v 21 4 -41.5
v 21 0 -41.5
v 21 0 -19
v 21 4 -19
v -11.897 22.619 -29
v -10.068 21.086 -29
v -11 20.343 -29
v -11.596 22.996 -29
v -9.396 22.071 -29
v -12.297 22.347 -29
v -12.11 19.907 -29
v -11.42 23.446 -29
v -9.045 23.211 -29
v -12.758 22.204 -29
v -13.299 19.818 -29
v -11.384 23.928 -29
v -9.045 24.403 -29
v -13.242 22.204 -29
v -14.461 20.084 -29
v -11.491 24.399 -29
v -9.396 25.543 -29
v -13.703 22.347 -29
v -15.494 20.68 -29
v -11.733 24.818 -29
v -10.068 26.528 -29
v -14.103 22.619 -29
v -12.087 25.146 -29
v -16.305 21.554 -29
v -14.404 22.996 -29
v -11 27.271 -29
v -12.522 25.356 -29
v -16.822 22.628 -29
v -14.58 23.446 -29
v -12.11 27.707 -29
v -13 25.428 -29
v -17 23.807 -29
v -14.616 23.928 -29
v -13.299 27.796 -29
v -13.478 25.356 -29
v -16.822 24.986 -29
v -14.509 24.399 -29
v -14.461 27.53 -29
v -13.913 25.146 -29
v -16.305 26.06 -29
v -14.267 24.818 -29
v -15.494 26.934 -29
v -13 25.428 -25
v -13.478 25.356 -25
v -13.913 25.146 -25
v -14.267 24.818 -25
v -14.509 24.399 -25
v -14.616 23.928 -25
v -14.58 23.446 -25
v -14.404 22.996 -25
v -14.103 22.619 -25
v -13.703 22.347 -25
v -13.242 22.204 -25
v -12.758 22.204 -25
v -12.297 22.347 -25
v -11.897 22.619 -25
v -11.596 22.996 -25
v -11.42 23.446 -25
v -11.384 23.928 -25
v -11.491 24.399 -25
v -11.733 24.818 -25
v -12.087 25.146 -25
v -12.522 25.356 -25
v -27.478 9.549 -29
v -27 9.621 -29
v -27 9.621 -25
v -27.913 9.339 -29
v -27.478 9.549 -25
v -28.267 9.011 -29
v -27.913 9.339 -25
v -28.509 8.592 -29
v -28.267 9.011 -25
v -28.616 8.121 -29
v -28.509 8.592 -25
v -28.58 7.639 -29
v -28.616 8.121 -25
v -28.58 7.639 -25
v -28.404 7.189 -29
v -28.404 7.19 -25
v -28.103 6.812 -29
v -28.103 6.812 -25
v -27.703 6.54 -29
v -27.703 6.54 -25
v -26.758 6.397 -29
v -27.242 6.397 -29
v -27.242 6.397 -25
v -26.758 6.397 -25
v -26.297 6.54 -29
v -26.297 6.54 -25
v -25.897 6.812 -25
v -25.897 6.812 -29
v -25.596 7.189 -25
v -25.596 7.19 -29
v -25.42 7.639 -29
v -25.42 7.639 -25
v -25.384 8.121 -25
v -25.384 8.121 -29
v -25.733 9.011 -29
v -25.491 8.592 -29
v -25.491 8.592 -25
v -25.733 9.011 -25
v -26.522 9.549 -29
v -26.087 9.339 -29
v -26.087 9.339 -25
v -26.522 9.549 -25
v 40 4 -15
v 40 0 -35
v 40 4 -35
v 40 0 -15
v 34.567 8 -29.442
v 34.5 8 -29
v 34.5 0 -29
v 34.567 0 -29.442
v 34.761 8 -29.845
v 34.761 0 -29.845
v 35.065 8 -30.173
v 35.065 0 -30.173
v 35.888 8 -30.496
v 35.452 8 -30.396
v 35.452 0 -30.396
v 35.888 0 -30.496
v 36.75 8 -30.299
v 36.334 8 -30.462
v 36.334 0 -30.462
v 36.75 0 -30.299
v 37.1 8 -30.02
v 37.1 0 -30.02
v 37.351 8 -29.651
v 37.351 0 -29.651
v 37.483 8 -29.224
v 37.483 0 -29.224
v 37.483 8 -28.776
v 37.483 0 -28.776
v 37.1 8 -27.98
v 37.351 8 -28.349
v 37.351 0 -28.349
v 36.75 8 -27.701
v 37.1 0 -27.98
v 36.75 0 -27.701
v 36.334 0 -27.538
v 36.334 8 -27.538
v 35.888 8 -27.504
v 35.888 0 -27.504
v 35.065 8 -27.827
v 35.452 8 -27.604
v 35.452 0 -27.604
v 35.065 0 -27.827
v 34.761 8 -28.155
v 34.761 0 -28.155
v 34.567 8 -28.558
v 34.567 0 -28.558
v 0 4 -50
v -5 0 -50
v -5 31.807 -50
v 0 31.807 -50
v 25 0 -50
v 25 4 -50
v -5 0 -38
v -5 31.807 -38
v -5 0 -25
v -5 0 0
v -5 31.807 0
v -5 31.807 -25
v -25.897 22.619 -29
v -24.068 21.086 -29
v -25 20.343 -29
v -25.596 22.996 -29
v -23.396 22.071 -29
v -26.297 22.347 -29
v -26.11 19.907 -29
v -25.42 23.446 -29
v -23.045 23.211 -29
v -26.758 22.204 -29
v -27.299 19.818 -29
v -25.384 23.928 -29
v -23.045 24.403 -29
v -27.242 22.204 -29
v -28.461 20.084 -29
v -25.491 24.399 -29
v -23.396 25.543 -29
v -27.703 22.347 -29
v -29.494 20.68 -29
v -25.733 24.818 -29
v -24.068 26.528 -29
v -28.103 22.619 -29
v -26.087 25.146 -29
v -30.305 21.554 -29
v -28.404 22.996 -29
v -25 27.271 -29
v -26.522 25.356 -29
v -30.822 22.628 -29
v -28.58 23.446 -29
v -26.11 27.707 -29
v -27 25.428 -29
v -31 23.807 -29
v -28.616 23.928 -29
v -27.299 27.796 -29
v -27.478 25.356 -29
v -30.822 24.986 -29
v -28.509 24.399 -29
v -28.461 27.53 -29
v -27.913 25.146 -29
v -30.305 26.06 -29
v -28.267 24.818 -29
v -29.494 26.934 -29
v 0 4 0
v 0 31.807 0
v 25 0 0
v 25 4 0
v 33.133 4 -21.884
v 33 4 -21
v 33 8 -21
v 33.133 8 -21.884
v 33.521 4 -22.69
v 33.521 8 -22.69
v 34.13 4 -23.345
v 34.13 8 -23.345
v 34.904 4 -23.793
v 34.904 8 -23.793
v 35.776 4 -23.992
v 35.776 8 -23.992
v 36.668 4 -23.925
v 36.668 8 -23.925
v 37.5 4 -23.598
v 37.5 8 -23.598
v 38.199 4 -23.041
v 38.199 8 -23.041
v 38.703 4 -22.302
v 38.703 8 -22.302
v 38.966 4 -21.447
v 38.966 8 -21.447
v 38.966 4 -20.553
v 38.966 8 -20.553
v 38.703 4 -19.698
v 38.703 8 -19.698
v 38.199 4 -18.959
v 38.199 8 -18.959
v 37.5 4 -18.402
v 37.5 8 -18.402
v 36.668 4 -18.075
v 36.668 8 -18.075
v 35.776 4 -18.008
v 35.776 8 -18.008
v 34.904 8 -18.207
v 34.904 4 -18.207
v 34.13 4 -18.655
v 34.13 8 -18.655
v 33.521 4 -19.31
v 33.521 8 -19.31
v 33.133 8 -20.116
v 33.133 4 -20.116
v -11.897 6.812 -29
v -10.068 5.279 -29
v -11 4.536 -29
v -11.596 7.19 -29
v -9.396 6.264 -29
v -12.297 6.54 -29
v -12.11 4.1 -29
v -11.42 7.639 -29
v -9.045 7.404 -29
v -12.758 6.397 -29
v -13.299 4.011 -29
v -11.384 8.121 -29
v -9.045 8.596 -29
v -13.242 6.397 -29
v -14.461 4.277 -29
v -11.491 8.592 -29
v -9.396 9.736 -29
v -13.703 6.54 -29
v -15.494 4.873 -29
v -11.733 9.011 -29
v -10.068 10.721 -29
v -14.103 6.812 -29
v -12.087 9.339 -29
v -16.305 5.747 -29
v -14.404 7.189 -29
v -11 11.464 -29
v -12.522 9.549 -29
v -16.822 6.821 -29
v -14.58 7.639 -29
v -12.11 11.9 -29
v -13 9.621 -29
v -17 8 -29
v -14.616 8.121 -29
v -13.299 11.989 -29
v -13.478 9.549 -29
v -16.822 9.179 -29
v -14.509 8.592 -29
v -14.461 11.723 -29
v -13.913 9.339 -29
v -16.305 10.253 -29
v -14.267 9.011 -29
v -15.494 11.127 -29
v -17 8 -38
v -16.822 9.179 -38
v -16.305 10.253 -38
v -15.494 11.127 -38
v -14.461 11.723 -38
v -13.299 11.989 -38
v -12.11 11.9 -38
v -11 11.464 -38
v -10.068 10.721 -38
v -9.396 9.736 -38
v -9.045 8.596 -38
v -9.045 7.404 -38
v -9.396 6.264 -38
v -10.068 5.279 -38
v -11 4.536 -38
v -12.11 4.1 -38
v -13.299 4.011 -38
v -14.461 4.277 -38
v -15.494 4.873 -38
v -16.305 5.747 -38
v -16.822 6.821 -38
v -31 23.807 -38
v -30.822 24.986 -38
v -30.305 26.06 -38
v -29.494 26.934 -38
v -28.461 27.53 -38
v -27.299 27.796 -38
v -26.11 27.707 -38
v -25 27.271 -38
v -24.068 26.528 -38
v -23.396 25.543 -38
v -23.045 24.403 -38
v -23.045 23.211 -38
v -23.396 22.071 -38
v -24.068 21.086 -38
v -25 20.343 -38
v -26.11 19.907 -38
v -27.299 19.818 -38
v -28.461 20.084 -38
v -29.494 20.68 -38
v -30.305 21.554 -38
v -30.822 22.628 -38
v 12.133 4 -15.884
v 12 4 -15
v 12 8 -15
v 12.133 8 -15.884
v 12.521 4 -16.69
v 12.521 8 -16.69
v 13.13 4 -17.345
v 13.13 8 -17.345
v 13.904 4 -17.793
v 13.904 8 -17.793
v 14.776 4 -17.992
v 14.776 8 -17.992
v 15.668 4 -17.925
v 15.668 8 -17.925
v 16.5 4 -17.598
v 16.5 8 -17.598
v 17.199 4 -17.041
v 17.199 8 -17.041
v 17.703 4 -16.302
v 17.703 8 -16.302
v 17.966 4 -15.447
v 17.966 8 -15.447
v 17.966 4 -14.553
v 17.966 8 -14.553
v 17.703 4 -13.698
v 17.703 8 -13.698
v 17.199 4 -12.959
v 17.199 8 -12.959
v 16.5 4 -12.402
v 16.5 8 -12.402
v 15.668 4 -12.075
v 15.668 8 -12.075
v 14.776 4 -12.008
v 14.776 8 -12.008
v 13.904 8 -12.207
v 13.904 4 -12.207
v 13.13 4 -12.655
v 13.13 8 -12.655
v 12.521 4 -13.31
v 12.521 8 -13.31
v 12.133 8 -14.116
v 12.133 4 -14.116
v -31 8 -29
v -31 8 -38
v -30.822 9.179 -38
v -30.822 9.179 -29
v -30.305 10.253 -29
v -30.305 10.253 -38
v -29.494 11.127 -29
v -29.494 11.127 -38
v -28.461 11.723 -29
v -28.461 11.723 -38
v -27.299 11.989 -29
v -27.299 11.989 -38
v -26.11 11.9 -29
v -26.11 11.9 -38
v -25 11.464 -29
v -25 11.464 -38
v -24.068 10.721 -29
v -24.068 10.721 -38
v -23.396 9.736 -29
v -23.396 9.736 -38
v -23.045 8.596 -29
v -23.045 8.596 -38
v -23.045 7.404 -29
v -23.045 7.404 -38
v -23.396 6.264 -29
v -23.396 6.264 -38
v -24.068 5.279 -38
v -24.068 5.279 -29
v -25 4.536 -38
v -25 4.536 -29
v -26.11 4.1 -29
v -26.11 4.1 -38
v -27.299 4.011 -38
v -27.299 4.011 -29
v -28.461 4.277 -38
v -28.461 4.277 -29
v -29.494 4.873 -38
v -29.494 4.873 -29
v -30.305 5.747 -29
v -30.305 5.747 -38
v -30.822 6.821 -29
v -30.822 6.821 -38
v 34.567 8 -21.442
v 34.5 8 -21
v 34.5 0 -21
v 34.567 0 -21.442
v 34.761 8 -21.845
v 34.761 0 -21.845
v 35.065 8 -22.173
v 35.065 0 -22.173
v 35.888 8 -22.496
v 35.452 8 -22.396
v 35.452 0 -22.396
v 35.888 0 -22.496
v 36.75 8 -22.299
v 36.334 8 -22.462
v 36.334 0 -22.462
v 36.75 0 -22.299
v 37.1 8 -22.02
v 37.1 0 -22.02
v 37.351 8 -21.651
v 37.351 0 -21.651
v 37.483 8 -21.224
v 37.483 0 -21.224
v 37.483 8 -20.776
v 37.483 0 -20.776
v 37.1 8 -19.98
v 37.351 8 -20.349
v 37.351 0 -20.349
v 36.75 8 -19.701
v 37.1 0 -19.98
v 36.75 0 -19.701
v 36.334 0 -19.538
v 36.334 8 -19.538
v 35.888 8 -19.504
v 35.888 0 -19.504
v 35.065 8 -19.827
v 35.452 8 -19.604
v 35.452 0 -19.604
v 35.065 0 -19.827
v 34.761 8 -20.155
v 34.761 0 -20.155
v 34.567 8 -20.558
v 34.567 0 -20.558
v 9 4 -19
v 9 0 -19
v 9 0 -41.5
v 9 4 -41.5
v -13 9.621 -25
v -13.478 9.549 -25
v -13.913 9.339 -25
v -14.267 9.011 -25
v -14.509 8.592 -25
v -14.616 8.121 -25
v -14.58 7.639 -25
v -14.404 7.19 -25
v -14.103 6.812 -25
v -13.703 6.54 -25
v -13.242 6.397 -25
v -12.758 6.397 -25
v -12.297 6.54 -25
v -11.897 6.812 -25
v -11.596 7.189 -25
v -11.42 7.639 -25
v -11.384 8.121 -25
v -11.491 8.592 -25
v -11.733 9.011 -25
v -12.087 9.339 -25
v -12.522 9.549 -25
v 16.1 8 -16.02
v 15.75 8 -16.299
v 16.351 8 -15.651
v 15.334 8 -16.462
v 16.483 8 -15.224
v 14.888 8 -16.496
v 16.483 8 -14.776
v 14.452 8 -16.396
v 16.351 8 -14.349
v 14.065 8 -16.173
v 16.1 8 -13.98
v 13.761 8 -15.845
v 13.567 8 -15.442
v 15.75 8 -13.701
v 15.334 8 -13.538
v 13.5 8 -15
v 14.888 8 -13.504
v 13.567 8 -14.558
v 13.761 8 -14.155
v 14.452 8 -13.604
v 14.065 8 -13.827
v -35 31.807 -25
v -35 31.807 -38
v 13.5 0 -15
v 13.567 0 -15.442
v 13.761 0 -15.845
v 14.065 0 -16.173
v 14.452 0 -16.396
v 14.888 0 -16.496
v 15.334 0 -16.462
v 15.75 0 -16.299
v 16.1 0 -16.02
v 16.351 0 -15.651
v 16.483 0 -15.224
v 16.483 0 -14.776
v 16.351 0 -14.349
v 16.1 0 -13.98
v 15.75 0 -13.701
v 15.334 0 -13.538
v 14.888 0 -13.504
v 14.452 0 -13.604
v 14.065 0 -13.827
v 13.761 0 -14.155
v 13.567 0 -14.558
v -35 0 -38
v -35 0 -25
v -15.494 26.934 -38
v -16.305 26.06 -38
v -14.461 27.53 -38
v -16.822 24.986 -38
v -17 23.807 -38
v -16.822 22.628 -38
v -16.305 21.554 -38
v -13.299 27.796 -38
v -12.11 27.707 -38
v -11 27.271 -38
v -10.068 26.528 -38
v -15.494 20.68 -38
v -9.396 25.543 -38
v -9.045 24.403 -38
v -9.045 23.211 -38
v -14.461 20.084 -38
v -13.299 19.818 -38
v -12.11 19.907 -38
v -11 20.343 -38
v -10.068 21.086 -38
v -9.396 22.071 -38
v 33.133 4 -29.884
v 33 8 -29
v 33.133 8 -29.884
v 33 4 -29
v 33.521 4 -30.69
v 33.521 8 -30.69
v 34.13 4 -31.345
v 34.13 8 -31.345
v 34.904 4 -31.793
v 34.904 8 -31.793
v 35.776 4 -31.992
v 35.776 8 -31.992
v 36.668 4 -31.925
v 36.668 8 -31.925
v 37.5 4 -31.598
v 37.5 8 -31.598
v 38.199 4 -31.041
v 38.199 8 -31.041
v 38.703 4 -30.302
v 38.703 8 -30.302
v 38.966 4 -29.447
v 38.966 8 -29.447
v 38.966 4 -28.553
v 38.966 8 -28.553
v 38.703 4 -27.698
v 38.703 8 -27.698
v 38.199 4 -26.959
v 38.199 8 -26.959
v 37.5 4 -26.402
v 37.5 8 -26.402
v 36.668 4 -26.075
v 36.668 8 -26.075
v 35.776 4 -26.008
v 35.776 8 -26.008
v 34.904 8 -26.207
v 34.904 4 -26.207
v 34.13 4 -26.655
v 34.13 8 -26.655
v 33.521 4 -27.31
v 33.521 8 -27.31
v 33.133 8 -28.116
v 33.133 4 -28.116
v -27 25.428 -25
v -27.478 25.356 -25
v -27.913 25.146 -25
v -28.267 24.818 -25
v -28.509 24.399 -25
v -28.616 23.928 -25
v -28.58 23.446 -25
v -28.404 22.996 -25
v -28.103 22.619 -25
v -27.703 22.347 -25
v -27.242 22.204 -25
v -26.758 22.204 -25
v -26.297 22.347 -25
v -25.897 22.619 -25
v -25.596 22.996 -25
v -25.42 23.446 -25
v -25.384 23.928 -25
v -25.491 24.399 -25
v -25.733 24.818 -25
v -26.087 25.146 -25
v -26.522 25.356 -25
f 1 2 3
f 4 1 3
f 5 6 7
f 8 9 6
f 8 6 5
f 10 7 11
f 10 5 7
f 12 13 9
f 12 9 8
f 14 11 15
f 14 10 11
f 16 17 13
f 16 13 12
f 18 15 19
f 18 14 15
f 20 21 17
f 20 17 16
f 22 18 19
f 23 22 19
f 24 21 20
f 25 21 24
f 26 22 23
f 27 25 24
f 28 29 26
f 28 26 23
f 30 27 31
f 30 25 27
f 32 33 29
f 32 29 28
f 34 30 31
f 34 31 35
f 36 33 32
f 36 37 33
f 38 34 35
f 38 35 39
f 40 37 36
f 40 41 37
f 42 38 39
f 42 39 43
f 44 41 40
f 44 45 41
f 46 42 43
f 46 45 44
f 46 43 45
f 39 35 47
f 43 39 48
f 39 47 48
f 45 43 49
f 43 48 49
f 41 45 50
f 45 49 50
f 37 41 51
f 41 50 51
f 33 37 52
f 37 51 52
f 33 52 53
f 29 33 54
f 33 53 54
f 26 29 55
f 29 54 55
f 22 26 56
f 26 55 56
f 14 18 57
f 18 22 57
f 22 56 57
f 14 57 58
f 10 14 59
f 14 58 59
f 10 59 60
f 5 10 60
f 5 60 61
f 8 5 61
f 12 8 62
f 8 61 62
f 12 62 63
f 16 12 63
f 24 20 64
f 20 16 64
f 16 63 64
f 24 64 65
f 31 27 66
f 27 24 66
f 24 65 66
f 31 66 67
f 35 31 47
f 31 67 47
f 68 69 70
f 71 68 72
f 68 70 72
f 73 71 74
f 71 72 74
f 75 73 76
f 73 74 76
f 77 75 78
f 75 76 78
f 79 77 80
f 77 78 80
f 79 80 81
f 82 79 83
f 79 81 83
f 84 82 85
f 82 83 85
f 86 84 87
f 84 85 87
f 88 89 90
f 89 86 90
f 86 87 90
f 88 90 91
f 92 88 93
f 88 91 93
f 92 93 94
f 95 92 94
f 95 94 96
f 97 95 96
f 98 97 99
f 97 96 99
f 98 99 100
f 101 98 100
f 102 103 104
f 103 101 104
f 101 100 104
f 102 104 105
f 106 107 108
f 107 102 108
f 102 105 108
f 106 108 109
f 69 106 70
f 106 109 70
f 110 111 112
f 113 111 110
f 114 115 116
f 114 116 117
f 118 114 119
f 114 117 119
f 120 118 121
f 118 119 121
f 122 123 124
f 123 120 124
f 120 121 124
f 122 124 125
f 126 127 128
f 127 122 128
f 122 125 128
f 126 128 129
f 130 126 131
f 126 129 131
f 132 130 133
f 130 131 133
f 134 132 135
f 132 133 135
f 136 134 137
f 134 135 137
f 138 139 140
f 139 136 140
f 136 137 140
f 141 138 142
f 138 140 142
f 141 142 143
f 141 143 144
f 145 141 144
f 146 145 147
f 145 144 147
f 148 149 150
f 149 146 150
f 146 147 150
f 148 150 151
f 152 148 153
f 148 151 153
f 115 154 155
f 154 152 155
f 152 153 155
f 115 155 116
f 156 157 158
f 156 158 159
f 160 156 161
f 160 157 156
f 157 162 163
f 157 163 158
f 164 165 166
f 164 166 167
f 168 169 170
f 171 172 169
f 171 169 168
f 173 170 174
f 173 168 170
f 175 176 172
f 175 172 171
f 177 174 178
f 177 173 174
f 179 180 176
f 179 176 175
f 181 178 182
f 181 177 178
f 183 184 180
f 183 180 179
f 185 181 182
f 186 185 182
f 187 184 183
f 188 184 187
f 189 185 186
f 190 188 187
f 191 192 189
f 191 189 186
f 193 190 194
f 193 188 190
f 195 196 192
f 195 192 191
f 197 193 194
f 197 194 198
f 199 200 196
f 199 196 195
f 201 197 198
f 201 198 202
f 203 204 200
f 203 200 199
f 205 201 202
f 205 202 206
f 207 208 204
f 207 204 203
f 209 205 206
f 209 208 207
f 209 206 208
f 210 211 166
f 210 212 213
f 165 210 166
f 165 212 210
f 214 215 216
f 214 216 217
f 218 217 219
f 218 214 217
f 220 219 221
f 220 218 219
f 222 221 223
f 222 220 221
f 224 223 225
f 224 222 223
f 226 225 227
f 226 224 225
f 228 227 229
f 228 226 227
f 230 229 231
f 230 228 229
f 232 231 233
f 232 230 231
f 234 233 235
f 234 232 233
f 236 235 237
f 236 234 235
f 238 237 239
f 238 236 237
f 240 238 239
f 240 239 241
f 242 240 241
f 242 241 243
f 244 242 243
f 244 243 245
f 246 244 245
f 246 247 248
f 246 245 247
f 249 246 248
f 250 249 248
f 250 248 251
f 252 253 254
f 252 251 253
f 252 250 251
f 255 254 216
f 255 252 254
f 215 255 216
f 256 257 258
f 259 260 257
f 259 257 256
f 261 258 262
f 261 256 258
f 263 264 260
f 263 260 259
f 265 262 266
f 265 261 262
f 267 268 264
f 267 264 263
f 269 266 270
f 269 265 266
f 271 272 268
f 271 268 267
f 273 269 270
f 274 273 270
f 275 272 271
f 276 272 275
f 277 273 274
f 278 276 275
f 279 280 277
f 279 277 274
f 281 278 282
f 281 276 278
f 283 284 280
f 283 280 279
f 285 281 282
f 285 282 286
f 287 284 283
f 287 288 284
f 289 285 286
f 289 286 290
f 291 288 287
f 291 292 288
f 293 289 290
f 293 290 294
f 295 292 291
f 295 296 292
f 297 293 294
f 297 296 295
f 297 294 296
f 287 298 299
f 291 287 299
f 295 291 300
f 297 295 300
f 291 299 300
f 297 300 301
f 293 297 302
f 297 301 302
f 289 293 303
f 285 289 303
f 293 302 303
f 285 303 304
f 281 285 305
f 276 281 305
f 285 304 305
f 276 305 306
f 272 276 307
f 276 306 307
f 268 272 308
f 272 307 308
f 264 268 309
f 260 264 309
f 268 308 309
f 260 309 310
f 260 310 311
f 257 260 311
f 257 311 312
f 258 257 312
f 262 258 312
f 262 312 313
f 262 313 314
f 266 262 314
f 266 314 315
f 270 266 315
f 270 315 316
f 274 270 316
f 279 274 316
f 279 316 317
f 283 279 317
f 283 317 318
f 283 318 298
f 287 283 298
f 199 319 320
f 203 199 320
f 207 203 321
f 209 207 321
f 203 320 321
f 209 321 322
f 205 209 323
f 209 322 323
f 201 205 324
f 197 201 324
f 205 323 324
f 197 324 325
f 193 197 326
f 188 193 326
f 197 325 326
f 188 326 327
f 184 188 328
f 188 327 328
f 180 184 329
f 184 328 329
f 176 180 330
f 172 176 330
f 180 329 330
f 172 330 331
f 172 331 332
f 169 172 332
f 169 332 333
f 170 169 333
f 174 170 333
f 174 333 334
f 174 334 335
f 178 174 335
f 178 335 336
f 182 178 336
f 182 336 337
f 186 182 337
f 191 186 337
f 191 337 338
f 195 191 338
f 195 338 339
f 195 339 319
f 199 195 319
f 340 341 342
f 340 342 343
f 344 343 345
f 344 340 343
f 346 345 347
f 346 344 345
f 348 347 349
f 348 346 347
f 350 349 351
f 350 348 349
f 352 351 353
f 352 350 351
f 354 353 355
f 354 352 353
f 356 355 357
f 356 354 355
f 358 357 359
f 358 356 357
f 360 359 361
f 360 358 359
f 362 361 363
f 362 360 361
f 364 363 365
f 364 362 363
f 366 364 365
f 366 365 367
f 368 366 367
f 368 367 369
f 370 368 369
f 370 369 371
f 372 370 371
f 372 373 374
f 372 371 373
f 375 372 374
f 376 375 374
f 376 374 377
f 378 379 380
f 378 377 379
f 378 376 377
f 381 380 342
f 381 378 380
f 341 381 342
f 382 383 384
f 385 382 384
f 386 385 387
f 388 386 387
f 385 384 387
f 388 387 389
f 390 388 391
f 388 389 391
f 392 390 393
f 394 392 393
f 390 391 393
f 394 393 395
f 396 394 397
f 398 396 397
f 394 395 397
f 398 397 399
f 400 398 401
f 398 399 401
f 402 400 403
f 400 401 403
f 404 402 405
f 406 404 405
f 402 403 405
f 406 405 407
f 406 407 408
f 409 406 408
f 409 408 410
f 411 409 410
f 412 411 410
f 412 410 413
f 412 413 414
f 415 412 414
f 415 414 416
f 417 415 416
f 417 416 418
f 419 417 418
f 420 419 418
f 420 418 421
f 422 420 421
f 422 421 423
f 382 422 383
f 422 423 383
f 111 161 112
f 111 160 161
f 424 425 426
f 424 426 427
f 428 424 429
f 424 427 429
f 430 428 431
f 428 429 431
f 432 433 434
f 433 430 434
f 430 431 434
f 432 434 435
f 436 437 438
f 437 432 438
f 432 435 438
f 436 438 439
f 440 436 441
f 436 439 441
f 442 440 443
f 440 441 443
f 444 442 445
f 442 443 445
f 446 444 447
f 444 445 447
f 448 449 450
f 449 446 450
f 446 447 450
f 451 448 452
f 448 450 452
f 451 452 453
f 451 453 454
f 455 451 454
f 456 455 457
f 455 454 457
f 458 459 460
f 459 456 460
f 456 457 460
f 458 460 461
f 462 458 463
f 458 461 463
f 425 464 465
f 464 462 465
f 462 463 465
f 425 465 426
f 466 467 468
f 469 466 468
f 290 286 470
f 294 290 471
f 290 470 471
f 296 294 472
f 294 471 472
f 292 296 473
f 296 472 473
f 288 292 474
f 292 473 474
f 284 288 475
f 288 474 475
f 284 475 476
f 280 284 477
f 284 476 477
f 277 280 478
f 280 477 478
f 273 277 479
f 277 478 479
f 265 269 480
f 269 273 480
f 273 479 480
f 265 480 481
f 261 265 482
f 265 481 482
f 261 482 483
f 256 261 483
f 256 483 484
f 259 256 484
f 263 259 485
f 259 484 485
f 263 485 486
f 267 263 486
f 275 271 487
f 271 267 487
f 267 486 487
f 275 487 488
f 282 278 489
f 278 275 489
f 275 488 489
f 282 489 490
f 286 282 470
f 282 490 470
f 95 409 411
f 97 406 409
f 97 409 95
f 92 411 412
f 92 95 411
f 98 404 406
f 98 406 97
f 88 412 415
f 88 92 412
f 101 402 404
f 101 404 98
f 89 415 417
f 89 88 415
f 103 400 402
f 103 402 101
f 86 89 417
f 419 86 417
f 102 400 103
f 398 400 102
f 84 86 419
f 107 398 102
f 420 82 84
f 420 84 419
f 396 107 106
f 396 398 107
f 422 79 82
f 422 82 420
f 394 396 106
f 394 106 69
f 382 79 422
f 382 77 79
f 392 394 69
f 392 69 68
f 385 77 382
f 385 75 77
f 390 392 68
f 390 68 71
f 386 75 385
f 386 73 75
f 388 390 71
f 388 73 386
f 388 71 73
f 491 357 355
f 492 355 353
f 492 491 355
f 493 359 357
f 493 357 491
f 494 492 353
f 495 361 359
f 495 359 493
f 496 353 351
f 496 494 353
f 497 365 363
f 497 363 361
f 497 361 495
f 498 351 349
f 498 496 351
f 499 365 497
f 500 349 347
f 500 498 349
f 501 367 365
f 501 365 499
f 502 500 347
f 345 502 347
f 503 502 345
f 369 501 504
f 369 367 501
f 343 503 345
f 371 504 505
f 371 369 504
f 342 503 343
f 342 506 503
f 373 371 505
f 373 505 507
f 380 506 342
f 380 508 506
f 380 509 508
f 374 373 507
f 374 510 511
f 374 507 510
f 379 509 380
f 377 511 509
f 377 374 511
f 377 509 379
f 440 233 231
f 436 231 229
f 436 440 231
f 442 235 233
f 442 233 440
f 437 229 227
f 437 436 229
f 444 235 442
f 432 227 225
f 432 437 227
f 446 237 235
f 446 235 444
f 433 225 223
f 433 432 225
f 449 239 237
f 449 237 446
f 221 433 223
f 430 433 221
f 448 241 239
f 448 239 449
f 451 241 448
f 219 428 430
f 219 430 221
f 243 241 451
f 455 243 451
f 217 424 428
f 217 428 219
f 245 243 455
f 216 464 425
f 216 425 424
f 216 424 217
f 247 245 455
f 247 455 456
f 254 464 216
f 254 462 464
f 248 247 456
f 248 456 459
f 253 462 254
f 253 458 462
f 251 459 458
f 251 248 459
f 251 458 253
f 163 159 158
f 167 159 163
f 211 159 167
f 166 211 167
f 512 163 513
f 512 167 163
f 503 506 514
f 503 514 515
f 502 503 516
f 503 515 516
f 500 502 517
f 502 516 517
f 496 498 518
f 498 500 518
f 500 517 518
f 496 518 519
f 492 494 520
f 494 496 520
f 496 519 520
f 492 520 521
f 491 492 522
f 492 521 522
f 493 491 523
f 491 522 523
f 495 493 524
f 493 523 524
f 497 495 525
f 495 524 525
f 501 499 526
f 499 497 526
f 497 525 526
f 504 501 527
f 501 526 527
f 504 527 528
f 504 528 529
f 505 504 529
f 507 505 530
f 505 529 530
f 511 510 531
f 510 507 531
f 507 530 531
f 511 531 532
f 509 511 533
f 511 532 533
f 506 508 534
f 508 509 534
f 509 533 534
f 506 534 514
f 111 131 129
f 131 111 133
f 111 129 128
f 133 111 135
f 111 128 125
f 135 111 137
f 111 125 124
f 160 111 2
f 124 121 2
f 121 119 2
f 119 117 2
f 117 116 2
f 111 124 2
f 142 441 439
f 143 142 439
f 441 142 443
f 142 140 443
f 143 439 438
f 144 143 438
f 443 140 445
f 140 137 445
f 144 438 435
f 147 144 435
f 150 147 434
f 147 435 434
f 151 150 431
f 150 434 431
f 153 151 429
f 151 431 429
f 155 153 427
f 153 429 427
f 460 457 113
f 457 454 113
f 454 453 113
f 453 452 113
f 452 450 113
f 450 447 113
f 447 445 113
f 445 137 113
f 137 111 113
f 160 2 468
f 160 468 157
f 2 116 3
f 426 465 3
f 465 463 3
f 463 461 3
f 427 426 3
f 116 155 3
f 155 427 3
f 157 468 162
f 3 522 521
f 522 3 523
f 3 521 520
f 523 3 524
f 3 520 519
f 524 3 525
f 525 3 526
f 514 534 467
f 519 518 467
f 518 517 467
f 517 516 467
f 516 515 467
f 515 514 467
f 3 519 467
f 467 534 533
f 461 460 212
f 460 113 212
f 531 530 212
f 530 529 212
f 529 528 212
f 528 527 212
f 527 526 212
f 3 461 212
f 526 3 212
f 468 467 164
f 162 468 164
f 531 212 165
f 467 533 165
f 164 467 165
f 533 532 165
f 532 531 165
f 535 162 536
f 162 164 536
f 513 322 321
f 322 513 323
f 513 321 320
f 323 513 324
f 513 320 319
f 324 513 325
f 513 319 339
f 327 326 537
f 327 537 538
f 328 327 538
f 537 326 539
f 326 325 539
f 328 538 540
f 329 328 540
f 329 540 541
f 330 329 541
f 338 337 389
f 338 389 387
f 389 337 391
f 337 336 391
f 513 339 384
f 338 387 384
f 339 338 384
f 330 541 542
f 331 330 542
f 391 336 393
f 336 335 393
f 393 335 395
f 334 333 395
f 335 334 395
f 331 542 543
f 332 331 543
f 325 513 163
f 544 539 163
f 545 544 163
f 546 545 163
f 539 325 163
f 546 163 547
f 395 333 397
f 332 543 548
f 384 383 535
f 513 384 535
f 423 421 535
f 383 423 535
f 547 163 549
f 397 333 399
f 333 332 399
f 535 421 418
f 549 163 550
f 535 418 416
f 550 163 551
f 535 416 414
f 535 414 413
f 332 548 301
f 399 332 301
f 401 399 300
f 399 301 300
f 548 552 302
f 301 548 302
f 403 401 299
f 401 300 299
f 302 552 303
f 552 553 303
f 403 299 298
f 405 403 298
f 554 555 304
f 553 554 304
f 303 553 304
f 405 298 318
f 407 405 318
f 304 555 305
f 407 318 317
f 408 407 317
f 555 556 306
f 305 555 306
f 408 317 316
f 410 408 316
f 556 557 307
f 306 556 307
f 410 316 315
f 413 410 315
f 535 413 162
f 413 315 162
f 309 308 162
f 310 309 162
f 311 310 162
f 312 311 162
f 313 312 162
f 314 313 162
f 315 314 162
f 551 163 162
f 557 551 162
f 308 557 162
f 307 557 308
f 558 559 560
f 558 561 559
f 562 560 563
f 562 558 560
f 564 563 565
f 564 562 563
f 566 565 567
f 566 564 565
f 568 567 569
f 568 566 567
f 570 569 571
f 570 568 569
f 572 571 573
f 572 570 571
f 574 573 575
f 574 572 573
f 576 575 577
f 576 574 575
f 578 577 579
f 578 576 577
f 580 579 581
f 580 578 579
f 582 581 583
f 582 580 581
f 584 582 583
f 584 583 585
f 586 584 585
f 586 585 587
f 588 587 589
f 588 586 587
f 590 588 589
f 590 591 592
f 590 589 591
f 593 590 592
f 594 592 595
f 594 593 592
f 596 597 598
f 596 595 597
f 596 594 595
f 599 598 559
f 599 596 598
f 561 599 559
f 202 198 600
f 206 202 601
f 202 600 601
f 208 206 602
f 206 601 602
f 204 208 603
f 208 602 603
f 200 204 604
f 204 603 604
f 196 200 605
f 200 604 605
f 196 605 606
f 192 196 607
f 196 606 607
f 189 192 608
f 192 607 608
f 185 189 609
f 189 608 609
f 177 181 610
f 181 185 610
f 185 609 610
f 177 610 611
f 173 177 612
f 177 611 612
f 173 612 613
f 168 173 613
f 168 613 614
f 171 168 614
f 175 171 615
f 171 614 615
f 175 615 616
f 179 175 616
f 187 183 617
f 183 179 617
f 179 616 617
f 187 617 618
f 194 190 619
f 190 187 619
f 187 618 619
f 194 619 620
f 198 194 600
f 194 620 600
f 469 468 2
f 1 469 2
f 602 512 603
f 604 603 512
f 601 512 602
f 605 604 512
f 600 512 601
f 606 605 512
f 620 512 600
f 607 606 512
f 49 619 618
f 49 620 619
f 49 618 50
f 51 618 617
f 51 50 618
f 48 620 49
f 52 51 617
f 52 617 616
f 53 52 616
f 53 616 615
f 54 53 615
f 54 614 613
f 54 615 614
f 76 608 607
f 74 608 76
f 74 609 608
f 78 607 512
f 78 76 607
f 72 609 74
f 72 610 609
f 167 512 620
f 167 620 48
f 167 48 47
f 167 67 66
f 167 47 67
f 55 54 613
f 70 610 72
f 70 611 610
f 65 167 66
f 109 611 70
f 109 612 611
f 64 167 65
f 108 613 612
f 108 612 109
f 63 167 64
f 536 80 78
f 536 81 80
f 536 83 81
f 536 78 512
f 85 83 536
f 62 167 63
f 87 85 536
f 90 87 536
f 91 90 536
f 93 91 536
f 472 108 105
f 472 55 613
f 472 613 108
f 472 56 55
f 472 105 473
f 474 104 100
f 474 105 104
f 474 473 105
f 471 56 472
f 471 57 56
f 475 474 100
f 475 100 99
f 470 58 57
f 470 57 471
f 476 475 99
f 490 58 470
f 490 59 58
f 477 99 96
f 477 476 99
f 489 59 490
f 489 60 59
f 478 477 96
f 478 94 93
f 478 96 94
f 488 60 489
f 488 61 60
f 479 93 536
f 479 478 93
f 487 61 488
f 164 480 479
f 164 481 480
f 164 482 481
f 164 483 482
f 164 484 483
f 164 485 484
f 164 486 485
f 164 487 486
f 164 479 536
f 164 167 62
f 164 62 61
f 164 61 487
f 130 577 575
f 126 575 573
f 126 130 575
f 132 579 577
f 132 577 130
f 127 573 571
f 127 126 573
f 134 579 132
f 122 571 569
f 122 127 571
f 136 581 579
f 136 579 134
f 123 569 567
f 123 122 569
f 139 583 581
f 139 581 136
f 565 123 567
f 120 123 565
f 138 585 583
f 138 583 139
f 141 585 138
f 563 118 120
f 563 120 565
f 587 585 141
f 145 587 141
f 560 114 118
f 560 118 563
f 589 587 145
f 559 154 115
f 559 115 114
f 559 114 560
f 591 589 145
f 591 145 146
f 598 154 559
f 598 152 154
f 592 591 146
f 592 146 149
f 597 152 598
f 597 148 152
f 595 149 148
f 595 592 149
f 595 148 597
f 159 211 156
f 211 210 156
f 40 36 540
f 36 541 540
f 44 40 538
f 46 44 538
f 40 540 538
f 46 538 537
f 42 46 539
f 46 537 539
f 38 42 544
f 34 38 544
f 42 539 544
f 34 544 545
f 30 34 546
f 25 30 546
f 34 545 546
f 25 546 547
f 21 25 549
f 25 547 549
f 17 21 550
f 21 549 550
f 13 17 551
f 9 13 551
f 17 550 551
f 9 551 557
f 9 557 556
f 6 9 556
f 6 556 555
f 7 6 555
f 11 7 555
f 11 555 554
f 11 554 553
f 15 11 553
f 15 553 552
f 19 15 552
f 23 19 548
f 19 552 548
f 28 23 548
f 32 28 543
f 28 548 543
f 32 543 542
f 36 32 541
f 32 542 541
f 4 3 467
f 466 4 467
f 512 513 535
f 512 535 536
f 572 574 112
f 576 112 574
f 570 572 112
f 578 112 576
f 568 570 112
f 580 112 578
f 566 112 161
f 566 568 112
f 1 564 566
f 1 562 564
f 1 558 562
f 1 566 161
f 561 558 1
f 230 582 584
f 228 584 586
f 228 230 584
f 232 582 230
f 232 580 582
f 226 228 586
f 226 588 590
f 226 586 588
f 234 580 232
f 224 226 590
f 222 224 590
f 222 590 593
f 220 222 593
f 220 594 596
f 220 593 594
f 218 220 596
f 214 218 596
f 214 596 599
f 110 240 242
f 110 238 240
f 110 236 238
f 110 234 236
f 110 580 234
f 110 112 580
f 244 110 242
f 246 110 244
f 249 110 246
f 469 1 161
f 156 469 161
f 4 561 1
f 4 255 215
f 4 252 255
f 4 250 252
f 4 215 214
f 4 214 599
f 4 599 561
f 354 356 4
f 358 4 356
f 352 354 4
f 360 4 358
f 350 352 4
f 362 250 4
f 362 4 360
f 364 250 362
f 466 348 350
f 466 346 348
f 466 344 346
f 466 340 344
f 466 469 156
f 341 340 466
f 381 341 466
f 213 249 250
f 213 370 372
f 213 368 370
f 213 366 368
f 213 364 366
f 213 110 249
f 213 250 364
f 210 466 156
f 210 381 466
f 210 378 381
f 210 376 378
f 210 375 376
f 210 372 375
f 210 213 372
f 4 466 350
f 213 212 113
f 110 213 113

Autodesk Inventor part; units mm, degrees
ref_plane "YZ Plane" through (0, 0, 0) normal (1, 0, 0) x (0, 1, 0)
ref_plane "XZ Plane" through (0, 0, 0) normal (0, 1, 0) x (-1, 0, 0)
ref_plane "XY Plane" through (0, 0, 0) normal (0, 0, 1) x (1, 0, 0)
sketch "Sketch1" plane through (0, 0, 0) normal (0, 1, 0) x (-1, 0, 0)
  point P0 (0, 0)
sketch "Sketch2" plane through (0, 0, 0) normal (0, 1, 0) x (-1, 0, 0)
  line L0 (0, 0) -> (0, -50)
  line L1 (0, -50) -> (-25, -50)
  line L2 (-40, -35) -> (-40, -15)
  line L3 (-25, 0) -> (0, 0)
  line L4 (-25, -50) -> (-40, -35)
  line L5 (-25, 0) -> (-40, -15)
  line L6 (-9, -35) -> (-9, -41.5)
  line L7 (-9, -41.5) -> (-21, -41.5)
  line L8 (-21, -41.5) -> (-21, -19)
  line L9 (-21, -19) -> (-9, -19)
  line L10 (-9, -19) -> (-9, -35)
  circle A0 centre (-15, -15) radius 3
  line L11 (0, -25) -> (-40, -25)
  circle A1 centre (-15, -15) radius 1.5
  line L12 (0, 0) -> (5, 0)
  line L13 (5, 0) -> (5, -50)
  line L14 (5, -50) -> (0, -50)
  circle A2 centre (-36, -21) radius 3
  circle A3 centre (-36, -29) radius 3
  circle A4 centre (-36, -21) radius 1.5
  circle A5 centre (-36, -29) radius 1.5
  dimension "d0" = 50
  dimension "d1" = 25
  dimension "d4" = 20
  dimension "d7" = 6.5
  dimension "d8" = 12
  dimension "d9" = 22.5
  dimension "d10" = 6
  dimension "d13" = 3
  dimension "d16" = 5
  dimension "d17" = 6
  dimension "d18" = 6
  dimension "d19" = 3
  dimension "d20" = 3
extrude "Extrusion1" add sketch "Sketch2" along normal blind 8 contours A0 | A2 | A3
extrude "Extrusion2" add sketch "Sketch2" along normal blind 4 contours L0 L11 L10 L9 L8 L2 L5 L3 | L0 L1 L4 L2 L11 L8 L7 L6 L10
extrude "Extrusion3" add sketch "Sketch2" along normal blind 31.807 contours L12 L13 L14 L0
sketch "Szkic4" plane through (-5, 0, -50) normal (-1, 0, 0) x (0, 0, 1)
  line L0 (0, 0) -> (50, 0) projected
  line L1 (50, 0) -> (50, 31.807) projected
  line L2 (0, 31.807) -> (50, 31.807) projected
  line L3 (0, 0) -> (0, 31.807) projected
  line L4 (38, 21.6151) -> (12, 21.6151)
  line L5 (25, 21.6151) -> (25, 0)
  line L6 (25, 21.6151) -> (25, 31.807)
  line L7 (12, 21.6151) -> (12, 31.807)
  line L8 (12, 21.6151) -> (12, 0)
  dimension "d32" = 31.807
  dimension "d33" = 50
  dimension "d34" = 26
  dimension "d35" = 12
  dimension "d36" = 12
  dimension "d37" = 13
extrude "Wyciągnięcie proste5" add sketch "Szkic4" along normal blind 30 contours L8 L4 L5 L0 | L7 L2 L6 L4
sketch "Szkic5" plane through (-5, 0, -38) normal (0, 0, -1) x (-1, 0, 0)
  line L0 (0, 0) -> (30, 0) projected
  line L1 (0, 31.807) -> (30, 31.807) projected
  line L2 (30, 31.807) -> (30, 0) projected
  line L3 (0, 0) -> (0, 31.807) projected
  line L4 (0, 0) -> (30, 0) projected
  line L5 (30, 31.807) -> (30, 0) projected
  line L6 (0, 31.807) -> (30, 31.807) projected
  point P0 (-5, 0)
  point P1 (22, 8)
  point P2 (22, 23.807)
  point P3 (8, 8)
  point P4 (8, 23.807)
  dimension "d40" = 8
  dimension "d41" = 8
  dimension "d42" = 8
  dimension "d43" = 8
  dimension "d51" = 8
  dimension "d52" = 8
  dimension "d53" = 8
  dimension "d54" = 8
hole "Otwór1" at (-27, 8, -38) at (-27, 23.807, -38) at (-13, 8, -38) at (-13, 23.807, -38) direction (0, 0, 1) diameter 3.242 end through all thread size "M4x0.7" designation "M4" class "6H" standard "GB Metric profile"
sketch "Szkic6" plane through (-5, 0, -38) normal (0, 0, -1) x (-1, 0, 0)
  circle A0 centre (8, 23.807) radius 1.621 projected
  circle A1 centre (8, 8) radius 1.621 projected
  circle A2 centre (22, 23.807) radius 1.621 projected
  circle A3 centre (22, 8) radius 1.621 projected
  line L0 (0, 0) -> (0, 31.807) projected
  line L1 (0, 0) -> (30, 0) projected
  line L2 (30, 31.807) -> (30, 0) projected
  line L3 (0, 31.807) -> (30, 31.807) projected
  circle A4 centre (8, 23.807) radius 4
  circle A5 centre (22, 23.807) radius 4
  circle A6 centre (22, 8) radius 4
  circle A7 centre (8, 8) radius 4
  point P0 (-5, 0)
  dimension "d55" = 8
  dimension "d56" = 8
  dimension "d57" = 8
  dimension "d58" = 8
extrude "Wyciągnięcie proste6" cut sketch "Szkic6" against normal blind 9 contours A4 | A5 | A6 | A7
properties part number "podstawachwytak"
